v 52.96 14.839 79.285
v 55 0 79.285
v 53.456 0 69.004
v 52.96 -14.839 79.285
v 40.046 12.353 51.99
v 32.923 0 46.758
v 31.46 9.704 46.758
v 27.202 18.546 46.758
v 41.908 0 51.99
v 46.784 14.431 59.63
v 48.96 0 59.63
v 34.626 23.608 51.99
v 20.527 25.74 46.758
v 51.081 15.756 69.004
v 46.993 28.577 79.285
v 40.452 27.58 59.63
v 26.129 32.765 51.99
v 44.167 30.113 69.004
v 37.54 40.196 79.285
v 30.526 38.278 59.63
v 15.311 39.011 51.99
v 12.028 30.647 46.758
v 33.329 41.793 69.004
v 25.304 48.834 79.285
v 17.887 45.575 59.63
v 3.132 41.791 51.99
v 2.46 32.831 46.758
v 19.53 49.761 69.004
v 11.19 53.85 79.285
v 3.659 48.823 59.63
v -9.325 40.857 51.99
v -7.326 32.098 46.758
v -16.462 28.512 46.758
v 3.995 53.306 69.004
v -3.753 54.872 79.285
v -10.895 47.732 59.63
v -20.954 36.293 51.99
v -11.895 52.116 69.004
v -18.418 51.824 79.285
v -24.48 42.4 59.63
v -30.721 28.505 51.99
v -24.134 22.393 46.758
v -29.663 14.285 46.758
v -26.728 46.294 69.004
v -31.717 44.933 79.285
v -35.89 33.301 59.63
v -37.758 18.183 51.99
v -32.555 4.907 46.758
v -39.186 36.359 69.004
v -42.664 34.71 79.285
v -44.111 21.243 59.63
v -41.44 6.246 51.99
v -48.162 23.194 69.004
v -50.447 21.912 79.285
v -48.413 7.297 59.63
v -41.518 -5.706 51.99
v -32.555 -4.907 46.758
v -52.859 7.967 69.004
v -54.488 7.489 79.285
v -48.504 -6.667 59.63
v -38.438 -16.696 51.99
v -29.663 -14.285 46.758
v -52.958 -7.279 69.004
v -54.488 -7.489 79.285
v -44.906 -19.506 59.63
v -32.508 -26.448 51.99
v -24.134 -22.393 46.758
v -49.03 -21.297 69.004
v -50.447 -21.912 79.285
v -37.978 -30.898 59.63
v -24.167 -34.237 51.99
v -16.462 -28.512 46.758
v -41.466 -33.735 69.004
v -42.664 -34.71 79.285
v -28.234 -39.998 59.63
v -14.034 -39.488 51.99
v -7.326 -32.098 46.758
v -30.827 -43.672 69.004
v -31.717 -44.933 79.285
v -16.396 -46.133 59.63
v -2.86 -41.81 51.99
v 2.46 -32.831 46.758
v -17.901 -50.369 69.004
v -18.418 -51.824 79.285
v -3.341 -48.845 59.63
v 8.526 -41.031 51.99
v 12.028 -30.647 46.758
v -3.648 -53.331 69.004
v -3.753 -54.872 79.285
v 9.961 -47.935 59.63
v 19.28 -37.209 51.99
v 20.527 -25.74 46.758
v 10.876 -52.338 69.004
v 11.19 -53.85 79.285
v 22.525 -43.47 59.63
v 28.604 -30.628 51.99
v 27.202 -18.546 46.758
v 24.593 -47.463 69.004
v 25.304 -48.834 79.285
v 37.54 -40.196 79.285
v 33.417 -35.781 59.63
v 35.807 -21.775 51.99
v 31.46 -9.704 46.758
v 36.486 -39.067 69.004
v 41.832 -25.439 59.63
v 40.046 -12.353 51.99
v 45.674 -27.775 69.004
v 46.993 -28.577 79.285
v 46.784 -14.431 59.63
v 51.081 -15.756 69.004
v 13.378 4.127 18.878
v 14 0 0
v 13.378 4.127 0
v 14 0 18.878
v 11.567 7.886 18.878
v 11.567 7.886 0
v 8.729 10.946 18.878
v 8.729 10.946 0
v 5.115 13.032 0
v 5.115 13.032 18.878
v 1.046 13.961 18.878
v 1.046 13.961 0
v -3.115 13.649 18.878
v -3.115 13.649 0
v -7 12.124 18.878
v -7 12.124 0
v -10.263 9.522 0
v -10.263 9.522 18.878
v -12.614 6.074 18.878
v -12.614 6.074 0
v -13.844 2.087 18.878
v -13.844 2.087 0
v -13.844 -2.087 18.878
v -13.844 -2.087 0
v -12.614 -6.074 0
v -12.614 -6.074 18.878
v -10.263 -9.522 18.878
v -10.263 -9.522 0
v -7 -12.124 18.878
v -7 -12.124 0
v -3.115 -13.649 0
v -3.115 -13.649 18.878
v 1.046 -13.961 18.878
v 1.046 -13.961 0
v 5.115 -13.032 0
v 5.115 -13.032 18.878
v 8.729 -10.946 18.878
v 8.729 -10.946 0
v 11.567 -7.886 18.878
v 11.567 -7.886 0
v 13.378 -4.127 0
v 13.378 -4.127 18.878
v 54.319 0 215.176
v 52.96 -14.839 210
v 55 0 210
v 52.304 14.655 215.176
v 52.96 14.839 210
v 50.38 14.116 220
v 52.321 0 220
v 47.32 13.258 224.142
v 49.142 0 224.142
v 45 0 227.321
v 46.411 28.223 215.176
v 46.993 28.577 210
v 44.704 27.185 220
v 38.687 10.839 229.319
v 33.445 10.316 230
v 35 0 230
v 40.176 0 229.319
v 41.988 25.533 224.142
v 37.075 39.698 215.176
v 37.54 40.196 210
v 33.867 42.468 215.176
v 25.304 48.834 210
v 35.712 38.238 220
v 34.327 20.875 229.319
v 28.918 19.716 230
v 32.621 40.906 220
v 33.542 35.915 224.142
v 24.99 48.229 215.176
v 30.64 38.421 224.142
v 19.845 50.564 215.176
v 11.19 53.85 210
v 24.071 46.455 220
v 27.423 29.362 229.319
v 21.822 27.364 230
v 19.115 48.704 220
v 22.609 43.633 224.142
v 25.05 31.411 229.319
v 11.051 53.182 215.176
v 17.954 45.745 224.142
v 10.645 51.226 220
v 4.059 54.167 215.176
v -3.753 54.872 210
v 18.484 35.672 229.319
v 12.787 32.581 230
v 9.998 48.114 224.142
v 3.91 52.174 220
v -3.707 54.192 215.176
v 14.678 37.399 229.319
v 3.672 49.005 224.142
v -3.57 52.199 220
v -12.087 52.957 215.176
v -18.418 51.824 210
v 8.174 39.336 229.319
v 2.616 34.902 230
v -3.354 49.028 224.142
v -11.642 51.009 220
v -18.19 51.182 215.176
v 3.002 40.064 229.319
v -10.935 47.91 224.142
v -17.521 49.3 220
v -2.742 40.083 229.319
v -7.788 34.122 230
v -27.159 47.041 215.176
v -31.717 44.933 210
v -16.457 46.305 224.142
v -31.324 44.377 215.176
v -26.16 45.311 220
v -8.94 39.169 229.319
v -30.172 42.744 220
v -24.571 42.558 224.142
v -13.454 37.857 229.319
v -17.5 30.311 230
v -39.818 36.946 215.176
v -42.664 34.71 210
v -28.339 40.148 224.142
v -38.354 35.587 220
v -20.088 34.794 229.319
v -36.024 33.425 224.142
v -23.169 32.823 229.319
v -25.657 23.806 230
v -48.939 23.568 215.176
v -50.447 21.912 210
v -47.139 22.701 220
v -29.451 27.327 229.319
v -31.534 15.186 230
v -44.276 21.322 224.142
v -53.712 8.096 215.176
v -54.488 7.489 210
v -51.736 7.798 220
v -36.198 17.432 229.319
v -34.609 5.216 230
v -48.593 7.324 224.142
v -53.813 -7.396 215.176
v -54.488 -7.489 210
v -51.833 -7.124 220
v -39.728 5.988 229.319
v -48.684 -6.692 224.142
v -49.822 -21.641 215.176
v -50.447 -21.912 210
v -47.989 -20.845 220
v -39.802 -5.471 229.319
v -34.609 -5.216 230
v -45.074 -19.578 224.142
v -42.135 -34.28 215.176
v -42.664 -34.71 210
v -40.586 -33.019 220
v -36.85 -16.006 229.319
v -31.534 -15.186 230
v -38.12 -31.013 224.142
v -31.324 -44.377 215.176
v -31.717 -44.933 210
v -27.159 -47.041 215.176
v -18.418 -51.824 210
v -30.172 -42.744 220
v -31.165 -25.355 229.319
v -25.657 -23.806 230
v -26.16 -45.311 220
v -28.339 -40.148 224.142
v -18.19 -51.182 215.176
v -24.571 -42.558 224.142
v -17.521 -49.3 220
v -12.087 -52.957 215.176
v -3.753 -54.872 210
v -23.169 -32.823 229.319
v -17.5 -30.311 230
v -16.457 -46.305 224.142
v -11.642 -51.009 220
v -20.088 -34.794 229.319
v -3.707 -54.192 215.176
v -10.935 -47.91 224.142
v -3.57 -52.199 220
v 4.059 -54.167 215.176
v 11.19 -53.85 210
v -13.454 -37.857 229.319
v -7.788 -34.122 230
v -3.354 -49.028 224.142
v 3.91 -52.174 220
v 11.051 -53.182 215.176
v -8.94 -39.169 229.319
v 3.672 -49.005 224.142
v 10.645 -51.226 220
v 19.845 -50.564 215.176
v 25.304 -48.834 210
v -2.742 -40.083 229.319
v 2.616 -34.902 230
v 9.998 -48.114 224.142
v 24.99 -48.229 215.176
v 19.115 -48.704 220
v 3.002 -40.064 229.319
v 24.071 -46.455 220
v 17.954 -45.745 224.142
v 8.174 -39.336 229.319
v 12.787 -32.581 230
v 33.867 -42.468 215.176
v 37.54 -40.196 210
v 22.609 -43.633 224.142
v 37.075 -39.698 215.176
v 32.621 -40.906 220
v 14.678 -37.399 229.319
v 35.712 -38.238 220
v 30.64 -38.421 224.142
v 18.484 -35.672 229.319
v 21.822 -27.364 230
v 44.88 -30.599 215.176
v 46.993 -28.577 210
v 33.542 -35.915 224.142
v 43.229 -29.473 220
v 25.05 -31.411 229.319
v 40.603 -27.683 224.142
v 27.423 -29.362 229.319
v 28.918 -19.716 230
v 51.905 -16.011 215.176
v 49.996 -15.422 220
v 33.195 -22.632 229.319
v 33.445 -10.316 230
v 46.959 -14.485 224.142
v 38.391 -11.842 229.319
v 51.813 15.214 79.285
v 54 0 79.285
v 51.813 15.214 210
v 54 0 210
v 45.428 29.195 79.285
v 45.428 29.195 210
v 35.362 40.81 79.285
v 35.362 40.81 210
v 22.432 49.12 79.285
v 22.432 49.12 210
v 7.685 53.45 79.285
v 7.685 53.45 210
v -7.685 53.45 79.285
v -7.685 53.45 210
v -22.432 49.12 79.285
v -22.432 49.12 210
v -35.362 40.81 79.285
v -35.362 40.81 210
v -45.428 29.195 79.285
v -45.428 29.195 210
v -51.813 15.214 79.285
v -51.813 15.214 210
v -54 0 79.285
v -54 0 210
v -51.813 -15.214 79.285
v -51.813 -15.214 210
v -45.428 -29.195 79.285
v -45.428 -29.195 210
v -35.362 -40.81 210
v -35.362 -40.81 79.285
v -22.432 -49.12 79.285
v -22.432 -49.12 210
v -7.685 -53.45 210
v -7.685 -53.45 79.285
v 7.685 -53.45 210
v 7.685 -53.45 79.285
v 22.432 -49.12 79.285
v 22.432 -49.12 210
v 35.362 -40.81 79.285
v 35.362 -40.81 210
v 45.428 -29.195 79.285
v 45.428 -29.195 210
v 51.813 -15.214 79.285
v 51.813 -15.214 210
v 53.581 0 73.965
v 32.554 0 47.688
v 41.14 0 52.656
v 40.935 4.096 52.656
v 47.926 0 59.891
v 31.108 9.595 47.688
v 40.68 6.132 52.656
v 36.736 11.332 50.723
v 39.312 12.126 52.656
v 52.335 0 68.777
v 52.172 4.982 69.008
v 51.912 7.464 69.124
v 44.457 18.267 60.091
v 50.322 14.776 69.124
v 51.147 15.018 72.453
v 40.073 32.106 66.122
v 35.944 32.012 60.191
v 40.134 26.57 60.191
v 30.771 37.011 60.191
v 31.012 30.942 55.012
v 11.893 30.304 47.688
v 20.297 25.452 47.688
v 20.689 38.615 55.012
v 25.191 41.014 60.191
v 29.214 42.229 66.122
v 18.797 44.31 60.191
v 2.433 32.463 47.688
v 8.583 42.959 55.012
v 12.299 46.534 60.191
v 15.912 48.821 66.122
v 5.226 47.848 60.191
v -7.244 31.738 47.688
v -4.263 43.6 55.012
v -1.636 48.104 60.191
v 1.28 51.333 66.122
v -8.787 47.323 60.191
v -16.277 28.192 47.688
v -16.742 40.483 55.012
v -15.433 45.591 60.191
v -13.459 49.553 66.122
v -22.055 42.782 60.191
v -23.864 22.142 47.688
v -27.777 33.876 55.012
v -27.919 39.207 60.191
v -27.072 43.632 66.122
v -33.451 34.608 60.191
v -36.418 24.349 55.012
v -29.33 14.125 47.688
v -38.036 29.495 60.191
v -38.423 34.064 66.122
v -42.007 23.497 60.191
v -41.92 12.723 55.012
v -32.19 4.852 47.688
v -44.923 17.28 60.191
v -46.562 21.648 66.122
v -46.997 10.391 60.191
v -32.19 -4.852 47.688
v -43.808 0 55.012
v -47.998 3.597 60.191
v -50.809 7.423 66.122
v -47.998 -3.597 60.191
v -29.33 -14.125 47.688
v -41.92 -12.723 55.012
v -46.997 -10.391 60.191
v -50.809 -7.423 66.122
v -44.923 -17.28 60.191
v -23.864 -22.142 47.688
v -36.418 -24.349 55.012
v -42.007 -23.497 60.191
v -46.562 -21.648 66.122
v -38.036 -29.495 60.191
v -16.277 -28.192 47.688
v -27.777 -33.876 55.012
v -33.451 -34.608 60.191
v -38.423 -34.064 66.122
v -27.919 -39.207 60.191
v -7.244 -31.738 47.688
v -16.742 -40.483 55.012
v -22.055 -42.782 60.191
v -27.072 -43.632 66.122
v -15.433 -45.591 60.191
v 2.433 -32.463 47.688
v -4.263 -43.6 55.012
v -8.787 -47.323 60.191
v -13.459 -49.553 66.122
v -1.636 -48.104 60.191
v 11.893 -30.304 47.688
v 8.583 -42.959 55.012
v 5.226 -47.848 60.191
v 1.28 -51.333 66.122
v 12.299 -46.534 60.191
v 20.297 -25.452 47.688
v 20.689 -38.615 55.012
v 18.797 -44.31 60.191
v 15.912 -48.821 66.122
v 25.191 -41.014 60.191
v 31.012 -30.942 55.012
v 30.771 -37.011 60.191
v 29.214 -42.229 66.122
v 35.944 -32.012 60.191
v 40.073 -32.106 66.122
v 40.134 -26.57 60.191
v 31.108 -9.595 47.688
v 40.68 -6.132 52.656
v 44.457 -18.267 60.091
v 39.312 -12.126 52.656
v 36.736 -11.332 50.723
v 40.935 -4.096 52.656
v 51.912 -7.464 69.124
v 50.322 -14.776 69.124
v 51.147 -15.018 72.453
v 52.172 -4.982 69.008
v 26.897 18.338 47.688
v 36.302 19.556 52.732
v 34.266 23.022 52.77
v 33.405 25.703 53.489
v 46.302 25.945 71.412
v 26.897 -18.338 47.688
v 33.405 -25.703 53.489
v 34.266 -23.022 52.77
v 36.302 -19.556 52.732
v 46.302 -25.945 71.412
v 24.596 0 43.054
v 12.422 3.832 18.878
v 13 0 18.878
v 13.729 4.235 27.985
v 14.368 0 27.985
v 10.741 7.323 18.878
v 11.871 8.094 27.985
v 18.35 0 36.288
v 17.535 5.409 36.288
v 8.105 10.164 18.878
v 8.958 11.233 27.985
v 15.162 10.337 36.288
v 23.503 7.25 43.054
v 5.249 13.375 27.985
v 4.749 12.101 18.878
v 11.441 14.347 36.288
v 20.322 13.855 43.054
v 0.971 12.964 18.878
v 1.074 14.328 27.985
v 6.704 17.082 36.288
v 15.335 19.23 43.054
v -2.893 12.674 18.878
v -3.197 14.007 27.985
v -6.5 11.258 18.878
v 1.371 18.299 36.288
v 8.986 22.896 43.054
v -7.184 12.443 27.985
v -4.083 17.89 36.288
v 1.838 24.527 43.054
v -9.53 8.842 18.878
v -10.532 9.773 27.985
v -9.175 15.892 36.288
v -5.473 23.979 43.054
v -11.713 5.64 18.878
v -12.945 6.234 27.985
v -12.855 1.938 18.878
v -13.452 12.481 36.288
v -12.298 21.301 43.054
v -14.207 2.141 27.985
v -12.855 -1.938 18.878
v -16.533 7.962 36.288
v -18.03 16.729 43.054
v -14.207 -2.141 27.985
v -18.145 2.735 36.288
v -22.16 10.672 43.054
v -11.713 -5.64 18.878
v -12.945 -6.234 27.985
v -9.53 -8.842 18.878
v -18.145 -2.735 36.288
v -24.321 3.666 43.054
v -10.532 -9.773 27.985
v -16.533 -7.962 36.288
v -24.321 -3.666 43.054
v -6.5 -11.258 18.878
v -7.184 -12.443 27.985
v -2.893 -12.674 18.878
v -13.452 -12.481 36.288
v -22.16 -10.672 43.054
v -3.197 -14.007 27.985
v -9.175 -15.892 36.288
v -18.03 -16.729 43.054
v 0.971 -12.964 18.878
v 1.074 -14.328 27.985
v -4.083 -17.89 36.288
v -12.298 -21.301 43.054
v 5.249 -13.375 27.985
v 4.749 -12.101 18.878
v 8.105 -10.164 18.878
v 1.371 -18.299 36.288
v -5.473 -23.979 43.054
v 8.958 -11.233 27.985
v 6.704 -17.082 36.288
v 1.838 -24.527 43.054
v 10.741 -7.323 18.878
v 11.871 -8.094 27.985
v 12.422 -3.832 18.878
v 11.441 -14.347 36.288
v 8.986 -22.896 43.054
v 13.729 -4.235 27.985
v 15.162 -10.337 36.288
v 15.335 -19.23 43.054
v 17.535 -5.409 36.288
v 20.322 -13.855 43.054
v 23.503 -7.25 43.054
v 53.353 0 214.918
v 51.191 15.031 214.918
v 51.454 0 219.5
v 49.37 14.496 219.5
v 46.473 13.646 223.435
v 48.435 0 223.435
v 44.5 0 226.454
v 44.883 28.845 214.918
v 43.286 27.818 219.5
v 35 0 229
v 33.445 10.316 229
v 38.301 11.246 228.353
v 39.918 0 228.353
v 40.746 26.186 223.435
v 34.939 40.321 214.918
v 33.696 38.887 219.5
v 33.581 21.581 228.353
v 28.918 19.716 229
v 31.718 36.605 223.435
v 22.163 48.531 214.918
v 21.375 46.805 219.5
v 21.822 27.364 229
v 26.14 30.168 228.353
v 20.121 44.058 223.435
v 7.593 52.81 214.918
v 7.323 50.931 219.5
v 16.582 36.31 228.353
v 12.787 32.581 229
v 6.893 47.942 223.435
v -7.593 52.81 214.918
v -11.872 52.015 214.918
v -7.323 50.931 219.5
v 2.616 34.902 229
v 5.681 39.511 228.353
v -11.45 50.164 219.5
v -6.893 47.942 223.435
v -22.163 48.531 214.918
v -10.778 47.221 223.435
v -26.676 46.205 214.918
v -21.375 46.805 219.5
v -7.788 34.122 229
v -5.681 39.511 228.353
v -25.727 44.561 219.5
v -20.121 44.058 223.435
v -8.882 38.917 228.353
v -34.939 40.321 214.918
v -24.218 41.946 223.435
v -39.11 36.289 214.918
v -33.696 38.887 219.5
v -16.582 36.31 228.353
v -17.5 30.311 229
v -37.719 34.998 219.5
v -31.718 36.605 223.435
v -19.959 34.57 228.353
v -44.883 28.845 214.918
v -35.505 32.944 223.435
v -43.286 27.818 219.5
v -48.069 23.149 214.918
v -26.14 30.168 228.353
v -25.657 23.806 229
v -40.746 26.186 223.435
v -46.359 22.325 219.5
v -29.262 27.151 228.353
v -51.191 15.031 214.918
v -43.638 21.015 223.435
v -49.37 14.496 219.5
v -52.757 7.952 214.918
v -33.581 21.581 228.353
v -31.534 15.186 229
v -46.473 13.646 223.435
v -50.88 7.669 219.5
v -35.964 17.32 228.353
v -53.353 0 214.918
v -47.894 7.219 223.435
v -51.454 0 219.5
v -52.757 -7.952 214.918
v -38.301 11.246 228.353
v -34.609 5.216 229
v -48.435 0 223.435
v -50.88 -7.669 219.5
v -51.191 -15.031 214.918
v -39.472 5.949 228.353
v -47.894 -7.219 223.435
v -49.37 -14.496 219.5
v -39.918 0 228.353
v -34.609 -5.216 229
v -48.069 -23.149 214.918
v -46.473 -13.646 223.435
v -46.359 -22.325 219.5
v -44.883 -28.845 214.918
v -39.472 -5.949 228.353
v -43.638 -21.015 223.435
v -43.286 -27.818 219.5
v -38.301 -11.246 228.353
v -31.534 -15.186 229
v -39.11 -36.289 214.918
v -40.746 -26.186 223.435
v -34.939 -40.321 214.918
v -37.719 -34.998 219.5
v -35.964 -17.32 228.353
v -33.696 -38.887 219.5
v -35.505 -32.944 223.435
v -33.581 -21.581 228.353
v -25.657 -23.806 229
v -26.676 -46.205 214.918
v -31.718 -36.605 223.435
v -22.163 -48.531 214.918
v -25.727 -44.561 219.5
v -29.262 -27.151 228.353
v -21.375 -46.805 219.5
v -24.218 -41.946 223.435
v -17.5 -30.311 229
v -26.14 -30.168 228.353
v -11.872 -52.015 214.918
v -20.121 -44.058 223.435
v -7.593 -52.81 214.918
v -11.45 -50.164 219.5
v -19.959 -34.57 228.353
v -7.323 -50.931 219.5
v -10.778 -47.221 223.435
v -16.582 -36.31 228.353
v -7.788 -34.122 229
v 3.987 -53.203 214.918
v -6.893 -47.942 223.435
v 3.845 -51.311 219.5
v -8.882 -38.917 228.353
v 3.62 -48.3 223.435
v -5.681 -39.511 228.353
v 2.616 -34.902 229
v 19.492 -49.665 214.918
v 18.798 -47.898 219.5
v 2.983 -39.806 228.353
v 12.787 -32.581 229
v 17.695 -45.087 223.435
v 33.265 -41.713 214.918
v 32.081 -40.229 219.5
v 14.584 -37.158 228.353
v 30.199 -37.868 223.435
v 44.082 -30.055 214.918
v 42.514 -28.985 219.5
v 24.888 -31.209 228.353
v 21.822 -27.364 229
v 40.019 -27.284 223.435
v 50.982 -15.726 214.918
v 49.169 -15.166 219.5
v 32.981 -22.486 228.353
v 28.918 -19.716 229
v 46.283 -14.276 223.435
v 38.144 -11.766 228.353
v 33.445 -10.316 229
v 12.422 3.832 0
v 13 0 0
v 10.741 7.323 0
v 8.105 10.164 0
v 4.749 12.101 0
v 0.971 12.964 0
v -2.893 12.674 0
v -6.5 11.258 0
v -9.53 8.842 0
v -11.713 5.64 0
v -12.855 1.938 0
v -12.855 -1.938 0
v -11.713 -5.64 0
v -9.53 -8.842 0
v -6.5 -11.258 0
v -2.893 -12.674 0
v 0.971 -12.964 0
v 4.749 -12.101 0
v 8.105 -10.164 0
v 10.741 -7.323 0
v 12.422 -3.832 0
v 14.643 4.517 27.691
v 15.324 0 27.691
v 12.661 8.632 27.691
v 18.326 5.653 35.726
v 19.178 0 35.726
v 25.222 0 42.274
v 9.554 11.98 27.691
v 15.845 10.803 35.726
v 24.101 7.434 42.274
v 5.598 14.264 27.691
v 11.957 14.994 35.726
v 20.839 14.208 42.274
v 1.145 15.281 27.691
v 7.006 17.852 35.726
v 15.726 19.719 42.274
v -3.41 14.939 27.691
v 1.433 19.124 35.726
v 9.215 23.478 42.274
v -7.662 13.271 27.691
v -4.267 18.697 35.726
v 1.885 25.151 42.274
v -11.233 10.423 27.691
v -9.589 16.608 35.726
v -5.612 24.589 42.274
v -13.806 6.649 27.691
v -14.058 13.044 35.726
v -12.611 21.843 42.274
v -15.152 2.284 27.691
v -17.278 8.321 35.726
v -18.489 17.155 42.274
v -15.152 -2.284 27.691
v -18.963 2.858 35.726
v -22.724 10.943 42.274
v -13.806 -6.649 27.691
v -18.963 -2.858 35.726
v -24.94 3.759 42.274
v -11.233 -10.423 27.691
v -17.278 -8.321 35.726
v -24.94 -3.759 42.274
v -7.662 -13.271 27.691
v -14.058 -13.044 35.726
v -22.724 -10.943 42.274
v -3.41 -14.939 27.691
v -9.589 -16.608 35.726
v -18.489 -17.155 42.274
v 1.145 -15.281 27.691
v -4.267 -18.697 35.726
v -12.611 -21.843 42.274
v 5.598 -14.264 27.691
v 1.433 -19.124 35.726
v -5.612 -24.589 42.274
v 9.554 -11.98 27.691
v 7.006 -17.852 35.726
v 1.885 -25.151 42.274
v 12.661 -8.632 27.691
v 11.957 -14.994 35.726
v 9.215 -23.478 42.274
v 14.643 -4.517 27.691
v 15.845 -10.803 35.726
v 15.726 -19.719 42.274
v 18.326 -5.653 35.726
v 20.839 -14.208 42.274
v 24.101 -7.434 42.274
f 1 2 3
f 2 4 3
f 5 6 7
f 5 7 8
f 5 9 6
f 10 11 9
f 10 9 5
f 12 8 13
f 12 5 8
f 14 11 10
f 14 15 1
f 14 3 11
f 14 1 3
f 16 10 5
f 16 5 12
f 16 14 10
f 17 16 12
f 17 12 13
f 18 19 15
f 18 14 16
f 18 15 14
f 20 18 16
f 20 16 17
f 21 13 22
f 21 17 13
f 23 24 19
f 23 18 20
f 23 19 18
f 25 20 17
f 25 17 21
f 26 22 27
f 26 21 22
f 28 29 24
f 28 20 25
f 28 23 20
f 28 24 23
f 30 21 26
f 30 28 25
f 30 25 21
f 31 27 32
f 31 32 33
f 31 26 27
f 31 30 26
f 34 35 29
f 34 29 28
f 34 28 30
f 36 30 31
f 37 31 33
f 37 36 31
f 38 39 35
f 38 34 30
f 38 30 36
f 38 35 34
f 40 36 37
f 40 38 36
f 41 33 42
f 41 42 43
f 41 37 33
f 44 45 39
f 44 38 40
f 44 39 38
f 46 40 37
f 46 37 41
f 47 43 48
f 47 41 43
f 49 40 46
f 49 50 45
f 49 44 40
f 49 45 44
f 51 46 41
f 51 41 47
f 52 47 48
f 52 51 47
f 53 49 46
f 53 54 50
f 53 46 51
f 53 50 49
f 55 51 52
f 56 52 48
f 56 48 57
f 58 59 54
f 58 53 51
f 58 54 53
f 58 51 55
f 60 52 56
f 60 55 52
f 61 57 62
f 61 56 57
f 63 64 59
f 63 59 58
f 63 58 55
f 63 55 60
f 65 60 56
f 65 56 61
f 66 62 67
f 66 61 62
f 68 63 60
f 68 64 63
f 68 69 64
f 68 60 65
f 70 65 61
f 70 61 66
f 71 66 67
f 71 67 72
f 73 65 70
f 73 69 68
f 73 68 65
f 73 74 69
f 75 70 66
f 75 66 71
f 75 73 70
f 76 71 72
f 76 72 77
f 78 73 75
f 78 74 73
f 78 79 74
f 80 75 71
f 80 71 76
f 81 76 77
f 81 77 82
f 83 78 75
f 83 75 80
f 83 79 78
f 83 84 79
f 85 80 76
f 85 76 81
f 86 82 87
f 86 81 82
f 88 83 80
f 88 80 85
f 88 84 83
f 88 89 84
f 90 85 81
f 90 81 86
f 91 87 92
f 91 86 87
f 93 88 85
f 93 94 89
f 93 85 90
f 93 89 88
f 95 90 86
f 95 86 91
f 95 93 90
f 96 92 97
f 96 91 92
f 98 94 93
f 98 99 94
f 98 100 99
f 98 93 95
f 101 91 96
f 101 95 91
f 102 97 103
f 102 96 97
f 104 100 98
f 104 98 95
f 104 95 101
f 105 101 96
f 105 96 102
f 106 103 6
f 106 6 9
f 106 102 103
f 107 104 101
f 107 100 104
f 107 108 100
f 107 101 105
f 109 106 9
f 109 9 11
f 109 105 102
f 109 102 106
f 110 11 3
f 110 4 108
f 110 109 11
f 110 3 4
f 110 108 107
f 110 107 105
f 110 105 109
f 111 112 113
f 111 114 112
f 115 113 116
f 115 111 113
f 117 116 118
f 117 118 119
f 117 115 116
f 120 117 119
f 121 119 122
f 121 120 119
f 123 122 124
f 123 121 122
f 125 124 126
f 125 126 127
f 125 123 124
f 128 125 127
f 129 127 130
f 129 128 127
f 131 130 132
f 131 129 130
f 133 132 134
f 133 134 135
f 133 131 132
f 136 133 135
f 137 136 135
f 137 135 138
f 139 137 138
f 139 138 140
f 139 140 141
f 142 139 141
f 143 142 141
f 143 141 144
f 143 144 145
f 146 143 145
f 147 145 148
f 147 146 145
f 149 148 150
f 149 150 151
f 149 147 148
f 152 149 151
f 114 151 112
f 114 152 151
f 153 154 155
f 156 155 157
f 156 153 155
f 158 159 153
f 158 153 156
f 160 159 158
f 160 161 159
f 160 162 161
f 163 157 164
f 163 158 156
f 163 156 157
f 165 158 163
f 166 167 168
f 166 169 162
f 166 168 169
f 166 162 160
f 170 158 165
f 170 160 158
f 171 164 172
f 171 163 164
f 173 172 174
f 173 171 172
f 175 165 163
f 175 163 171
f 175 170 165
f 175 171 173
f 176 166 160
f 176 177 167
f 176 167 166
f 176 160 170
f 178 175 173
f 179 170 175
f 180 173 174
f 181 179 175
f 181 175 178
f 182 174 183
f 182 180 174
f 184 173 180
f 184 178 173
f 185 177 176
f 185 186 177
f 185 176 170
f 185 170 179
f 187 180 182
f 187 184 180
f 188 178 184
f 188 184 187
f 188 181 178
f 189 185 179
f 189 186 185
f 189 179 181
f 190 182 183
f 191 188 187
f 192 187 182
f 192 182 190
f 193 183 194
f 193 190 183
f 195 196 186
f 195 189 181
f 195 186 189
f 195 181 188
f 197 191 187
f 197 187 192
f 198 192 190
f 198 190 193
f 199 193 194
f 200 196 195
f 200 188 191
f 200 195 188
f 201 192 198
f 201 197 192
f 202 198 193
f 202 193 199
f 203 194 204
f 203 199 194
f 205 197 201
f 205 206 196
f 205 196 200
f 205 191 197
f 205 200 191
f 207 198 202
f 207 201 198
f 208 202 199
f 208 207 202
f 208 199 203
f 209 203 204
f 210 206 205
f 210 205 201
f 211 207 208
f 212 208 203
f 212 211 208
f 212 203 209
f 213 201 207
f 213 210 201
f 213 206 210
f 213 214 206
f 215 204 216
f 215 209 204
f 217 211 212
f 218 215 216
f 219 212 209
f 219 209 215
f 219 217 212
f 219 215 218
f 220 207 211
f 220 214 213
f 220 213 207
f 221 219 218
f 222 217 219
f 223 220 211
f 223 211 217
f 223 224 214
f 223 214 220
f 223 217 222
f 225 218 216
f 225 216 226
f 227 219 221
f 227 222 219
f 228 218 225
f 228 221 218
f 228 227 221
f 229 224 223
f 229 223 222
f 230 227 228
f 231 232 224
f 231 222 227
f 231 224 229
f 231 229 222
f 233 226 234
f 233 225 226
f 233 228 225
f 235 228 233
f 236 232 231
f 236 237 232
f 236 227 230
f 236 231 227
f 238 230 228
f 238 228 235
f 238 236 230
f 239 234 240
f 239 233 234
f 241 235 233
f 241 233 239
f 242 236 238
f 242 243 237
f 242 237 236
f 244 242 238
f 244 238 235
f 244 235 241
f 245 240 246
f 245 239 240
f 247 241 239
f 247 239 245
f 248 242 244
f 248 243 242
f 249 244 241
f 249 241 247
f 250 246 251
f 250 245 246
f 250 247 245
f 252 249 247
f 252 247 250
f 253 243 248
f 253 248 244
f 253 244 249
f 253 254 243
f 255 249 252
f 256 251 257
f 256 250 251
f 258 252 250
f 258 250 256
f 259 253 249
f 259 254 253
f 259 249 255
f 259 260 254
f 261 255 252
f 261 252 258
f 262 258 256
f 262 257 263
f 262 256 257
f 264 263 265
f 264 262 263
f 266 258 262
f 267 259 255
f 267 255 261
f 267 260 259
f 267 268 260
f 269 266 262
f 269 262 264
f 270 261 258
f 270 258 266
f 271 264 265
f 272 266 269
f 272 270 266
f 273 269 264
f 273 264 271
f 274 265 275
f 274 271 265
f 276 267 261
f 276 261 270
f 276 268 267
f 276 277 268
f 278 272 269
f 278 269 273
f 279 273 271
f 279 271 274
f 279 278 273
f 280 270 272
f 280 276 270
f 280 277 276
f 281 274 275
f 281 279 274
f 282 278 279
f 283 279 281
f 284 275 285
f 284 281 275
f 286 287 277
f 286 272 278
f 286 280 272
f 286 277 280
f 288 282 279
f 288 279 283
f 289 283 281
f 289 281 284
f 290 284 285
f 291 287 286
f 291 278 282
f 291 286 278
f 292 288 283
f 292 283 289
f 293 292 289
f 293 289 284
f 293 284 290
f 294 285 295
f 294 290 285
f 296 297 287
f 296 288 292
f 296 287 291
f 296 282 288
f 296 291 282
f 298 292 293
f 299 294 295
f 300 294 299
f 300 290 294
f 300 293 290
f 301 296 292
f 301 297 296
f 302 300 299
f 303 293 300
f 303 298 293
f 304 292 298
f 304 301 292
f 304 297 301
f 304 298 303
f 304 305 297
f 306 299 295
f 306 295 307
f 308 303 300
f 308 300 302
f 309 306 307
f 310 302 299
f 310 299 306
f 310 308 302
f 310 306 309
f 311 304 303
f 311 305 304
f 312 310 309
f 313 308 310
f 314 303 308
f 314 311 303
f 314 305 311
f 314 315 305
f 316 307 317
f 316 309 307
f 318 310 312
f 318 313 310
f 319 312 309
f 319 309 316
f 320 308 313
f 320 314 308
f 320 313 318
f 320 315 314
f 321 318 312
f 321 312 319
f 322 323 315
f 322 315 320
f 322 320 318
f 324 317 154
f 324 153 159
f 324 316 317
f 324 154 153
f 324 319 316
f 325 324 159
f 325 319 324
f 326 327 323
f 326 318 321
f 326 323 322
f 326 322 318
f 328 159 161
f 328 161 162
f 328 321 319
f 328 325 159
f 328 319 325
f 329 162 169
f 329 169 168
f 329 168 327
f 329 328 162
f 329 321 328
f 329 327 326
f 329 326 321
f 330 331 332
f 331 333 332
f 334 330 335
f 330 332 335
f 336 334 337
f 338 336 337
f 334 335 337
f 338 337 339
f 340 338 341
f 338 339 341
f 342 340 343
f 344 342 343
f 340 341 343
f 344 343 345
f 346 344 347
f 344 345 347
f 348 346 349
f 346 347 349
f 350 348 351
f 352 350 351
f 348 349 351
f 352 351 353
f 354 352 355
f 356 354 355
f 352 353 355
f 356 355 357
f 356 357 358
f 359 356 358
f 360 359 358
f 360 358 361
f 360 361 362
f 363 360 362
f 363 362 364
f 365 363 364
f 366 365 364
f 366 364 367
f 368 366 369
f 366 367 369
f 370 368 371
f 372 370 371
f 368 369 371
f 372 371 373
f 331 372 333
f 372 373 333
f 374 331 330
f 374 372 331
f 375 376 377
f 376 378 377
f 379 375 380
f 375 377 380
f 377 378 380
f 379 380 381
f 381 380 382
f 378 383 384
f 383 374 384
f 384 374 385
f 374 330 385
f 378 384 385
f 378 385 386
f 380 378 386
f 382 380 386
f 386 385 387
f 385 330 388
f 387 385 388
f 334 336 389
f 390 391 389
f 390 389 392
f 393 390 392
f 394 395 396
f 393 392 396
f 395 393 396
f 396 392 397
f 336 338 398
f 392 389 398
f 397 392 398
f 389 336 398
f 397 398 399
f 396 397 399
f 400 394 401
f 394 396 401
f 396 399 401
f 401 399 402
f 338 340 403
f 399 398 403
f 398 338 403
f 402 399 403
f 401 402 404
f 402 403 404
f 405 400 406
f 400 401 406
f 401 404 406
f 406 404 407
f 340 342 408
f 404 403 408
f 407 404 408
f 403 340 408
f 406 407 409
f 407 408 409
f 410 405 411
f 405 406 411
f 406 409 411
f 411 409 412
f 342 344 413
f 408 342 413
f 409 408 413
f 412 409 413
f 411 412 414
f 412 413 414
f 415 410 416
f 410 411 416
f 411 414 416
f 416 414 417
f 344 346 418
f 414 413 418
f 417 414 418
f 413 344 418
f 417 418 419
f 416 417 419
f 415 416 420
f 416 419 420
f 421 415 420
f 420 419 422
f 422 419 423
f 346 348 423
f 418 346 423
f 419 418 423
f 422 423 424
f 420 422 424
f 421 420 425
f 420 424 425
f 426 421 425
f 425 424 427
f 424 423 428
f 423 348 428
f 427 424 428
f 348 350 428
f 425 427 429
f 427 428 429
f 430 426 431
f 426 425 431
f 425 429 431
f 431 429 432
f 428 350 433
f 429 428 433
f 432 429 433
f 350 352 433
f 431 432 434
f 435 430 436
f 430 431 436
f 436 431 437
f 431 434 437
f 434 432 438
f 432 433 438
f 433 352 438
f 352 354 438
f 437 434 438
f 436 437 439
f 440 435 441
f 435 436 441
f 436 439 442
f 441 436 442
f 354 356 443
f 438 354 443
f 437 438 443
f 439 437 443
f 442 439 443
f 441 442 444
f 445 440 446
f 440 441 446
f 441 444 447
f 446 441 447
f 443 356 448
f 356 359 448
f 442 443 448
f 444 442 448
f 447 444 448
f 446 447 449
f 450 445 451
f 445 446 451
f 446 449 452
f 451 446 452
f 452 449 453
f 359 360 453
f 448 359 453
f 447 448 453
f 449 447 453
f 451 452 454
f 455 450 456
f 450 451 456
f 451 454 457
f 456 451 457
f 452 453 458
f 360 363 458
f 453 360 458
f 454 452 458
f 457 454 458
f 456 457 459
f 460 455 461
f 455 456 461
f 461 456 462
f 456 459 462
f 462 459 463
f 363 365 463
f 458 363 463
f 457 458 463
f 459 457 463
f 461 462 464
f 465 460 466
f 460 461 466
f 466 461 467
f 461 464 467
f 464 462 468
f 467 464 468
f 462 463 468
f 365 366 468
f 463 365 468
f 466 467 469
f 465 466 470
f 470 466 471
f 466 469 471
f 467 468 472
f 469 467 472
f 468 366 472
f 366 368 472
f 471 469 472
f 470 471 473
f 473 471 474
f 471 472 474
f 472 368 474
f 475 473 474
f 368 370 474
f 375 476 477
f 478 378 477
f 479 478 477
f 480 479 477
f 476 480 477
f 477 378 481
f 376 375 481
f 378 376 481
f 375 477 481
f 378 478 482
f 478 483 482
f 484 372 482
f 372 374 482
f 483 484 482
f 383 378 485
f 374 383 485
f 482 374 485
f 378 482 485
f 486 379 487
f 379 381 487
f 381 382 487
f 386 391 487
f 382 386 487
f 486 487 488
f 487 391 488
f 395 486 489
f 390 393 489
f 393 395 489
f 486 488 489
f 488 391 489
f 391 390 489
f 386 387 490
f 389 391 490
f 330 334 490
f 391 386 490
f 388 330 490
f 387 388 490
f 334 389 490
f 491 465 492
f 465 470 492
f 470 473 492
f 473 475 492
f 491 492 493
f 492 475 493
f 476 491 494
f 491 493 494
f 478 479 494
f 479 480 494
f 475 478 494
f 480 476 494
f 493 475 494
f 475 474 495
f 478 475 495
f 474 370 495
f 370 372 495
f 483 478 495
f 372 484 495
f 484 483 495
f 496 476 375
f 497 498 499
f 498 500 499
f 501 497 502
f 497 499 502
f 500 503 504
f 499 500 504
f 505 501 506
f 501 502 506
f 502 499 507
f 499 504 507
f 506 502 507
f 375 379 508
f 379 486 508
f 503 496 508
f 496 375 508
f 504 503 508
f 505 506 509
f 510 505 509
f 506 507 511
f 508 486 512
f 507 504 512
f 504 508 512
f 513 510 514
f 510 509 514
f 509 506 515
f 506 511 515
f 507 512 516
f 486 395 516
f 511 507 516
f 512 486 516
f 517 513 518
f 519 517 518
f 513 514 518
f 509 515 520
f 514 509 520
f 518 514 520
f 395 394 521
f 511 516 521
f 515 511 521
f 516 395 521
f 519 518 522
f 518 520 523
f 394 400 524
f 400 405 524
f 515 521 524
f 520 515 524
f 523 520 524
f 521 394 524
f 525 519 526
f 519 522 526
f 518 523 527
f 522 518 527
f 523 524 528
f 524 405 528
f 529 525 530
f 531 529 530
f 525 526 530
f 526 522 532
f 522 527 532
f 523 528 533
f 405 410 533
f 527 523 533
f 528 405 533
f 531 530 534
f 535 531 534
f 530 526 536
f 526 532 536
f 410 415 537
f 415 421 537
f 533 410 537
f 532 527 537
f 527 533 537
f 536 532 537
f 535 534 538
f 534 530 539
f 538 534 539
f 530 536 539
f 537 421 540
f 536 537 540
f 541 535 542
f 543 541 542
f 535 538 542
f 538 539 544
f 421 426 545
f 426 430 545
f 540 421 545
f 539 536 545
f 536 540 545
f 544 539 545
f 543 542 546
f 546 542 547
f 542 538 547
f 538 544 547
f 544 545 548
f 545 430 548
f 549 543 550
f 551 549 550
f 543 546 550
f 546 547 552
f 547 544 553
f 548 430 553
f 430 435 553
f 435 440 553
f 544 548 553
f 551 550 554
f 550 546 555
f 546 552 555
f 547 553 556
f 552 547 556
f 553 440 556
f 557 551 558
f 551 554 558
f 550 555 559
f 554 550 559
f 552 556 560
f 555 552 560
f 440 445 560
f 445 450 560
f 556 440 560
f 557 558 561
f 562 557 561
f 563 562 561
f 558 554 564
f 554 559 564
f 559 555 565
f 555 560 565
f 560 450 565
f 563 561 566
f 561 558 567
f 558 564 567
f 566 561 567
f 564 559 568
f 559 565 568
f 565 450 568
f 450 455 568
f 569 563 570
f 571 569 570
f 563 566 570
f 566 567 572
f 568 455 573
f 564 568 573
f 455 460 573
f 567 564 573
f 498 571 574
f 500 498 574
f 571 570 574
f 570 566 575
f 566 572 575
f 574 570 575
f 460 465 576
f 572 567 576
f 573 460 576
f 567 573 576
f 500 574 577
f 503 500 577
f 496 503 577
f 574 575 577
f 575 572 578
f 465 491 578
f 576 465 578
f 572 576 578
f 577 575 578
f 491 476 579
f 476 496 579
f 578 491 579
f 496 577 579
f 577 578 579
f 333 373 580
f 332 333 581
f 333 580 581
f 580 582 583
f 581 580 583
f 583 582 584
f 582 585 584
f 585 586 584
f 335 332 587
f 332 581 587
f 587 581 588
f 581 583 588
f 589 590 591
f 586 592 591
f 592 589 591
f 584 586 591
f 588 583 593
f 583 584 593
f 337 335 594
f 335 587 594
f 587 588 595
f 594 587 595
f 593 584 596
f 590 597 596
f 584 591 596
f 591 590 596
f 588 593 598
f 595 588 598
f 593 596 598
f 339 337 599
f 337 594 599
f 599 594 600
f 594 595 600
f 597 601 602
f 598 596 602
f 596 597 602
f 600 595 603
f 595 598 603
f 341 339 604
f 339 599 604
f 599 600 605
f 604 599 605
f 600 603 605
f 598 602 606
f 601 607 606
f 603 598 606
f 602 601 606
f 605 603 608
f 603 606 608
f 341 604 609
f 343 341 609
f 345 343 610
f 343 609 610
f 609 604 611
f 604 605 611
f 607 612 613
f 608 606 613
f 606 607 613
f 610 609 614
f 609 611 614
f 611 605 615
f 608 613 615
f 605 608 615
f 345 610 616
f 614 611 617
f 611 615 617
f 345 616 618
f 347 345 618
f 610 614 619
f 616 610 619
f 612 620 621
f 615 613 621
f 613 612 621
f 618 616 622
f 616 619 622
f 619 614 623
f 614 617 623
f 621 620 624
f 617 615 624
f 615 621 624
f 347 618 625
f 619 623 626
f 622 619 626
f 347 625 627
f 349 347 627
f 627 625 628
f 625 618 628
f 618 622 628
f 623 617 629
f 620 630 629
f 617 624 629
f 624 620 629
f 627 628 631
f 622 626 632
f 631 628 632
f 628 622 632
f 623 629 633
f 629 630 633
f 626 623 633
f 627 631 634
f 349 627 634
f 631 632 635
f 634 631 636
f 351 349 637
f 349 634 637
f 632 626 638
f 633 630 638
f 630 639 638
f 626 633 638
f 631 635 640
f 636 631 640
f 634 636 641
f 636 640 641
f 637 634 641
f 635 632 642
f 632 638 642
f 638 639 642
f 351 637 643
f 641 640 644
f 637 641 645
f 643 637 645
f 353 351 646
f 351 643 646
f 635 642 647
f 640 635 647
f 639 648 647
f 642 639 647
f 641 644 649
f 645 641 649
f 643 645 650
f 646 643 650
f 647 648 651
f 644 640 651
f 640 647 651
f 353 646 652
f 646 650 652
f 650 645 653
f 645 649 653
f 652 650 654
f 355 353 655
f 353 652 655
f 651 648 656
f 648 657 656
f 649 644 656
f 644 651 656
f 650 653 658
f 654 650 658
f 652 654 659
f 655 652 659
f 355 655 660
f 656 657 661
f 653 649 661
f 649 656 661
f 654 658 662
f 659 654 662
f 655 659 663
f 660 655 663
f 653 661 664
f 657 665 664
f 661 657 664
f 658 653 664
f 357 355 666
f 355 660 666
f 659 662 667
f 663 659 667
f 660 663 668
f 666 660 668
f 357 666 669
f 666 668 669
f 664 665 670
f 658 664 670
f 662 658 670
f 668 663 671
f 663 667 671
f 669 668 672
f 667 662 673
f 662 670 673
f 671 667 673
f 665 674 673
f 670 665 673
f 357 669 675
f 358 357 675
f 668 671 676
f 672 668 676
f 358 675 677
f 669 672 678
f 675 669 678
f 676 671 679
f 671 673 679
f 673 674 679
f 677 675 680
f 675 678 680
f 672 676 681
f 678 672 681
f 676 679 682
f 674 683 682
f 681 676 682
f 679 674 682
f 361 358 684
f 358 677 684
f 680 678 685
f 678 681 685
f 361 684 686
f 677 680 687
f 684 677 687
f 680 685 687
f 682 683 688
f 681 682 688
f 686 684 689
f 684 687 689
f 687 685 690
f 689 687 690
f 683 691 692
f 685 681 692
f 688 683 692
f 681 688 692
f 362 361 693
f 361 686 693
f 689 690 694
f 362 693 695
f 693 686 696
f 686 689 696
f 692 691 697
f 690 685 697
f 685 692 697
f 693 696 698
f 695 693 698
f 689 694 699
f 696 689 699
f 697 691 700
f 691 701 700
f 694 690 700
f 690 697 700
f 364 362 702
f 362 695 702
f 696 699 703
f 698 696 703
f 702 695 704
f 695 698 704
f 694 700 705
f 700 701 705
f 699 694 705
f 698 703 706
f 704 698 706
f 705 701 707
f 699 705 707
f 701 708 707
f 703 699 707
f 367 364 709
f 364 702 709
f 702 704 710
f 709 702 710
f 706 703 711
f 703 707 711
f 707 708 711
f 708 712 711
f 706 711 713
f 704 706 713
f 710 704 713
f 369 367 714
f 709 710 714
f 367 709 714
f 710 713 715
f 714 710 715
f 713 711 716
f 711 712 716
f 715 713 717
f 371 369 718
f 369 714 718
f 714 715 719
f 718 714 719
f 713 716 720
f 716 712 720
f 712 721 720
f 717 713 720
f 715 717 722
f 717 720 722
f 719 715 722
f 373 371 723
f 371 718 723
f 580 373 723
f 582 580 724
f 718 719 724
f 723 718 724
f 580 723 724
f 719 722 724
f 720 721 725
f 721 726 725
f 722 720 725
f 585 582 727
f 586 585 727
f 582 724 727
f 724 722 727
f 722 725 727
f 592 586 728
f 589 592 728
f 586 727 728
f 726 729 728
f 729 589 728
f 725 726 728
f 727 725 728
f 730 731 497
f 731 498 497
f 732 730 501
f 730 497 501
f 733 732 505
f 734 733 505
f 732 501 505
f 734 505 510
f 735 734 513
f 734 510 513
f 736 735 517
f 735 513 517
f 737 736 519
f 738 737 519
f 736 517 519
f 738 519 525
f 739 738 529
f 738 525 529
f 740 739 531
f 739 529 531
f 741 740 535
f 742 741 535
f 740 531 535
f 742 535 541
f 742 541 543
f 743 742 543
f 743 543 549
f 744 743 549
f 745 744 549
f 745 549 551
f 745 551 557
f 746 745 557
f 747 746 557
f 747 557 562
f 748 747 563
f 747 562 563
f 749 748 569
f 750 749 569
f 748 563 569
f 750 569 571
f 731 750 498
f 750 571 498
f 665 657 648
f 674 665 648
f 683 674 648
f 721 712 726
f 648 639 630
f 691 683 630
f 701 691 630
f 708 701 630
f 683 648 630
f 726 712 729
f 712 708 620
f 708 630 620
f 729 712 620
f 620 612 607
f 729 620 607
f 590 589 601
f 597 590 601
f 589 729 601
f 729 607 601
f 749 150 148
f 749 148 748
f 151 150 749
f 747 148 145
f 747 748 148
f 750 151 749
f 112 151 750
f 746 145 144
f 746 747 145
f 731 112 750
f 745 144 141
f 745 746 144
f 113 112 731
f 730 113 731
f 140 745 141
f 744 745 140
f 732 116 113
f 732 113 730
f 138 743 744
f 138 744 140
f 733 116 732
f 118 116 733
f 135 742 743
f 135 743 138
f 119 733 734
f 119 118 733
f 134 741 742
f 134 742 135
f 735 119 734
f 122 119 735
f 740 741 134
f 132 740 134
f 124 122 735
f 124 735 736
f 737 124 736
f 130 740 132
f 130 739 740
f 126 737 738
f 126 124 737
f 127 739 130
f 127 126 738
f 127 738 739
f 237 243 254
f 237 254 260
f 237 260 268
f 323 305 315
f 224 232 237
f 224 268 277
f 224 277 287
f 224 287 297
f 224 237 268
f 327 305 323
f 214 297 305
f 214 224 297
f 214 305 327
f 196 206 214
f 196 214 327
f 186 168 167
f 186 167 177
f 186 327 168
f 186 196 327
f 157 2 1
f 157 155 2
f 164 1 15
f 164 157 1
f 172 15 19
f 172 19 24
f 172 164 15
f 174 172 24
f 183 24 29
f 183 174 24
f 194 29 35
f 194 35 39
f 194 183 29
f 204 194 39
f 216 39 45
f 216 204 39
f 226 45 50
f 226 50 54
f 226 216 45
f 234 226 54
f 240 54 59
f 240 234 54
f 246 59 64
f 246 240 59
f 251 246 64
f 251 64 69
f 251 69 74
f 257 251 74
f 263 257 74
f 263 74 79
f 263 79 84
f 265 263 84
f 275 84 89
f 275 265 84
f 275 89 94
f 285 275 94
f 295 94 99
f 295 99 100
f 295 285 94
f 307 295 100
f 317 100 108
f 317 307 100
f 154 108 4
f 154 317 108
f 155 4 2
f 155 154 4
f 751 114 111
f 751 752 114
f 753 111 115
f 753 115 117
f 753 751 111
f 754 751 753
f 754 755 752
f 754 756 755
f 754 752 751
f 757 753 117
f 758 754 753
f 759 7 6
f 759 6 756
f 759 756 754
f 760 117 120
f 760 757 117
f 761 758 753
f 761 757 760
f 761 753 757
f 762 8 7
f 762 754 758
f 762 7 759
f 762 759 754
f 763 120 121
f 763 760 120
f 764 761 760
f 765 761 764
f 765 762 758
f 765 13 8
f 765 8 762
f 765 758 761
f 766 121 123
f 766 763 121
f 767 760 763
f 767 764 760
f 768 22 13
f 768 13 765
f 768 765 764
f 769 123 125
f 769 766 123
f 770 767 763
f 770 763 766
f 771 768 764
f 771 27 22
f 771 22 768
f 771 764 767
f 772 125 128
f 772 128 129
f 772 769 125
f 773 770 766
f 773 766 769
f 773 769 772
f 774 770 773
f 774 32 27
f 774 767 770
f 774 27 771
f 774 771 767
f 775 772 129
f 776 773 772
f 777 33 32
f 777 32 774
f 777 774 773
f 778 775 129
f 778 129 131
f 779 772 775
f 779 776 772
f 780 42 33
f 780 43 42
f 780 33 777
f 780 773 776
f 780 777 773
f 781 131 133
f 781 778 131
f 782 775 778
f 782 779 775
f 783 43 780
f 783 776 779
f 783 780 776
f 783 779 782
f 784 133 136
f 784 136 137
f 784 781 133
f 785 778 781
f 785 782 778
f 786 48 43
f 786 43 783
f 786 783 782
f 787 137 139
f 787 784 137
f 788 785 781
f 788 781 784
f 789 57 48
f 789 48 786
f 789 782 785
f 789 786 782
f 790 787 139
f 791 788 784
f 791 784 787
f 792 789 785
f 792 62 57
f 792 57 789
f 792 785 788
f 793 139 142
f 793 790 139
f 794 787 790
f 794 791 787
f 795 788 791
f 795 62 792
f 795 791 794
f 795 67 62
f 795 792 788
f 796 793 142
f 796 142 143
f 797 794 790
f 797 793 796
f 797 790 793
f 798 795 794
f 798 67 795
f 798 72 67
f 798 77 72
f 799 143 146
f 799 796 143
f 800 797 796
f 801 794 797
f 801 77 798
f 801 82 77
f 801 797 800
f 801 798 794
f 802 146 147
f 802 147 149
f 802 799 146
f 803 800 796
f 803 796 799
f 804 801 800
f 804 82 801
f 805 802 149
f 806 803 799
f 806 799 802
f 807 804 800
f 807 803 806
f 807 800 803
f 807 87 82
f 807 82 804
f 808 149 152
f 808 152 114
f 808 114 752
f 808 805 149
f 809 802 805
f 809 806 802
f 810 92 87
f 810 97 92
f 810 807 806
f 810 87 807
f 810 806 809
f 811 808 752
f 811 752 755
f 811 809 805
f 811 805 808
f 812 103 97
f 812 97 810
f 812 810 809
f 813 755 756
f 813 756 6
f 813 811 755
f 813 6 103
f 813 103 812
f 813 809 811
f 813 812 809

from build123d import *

# Parameters (mm, degrees)
F2_T = -1


with BuildPart() as f1:
    # F0 (on Front) → F1 (revolve)
    with BuildSketch(Plane.XZ):
        with BuildLine():
            Line((0, 230), (0, 0))
            Line((0, 0), (14, 0))
            Line((14, 0), (14, 18.8783))
            ThreePointArc((14, 18.8783), (19.177554, 35.726034), (32.923077, 46.758432))
            ThreePointArc((32.923077, 46.758432), (48.959521, 59.629563), (55, 79.285253))
            Line((55, 79.285253), (55, 210))
            ThreePointArc((55, 210), (49.142136, 224.142136), (35, 230))
            Line((35, 230), (0, 230))
        make_face()
    revolve(axis=Axis((0, 0, 115), (0, 0, 1)))

    # F2
    f2_openings = [f1.faces().sort_by_distance(p)[0] for p in [
        (0, 0, 0),
    ]]
    offset(amount=F2_T, openings=f2_openings)


solid = f1.part
